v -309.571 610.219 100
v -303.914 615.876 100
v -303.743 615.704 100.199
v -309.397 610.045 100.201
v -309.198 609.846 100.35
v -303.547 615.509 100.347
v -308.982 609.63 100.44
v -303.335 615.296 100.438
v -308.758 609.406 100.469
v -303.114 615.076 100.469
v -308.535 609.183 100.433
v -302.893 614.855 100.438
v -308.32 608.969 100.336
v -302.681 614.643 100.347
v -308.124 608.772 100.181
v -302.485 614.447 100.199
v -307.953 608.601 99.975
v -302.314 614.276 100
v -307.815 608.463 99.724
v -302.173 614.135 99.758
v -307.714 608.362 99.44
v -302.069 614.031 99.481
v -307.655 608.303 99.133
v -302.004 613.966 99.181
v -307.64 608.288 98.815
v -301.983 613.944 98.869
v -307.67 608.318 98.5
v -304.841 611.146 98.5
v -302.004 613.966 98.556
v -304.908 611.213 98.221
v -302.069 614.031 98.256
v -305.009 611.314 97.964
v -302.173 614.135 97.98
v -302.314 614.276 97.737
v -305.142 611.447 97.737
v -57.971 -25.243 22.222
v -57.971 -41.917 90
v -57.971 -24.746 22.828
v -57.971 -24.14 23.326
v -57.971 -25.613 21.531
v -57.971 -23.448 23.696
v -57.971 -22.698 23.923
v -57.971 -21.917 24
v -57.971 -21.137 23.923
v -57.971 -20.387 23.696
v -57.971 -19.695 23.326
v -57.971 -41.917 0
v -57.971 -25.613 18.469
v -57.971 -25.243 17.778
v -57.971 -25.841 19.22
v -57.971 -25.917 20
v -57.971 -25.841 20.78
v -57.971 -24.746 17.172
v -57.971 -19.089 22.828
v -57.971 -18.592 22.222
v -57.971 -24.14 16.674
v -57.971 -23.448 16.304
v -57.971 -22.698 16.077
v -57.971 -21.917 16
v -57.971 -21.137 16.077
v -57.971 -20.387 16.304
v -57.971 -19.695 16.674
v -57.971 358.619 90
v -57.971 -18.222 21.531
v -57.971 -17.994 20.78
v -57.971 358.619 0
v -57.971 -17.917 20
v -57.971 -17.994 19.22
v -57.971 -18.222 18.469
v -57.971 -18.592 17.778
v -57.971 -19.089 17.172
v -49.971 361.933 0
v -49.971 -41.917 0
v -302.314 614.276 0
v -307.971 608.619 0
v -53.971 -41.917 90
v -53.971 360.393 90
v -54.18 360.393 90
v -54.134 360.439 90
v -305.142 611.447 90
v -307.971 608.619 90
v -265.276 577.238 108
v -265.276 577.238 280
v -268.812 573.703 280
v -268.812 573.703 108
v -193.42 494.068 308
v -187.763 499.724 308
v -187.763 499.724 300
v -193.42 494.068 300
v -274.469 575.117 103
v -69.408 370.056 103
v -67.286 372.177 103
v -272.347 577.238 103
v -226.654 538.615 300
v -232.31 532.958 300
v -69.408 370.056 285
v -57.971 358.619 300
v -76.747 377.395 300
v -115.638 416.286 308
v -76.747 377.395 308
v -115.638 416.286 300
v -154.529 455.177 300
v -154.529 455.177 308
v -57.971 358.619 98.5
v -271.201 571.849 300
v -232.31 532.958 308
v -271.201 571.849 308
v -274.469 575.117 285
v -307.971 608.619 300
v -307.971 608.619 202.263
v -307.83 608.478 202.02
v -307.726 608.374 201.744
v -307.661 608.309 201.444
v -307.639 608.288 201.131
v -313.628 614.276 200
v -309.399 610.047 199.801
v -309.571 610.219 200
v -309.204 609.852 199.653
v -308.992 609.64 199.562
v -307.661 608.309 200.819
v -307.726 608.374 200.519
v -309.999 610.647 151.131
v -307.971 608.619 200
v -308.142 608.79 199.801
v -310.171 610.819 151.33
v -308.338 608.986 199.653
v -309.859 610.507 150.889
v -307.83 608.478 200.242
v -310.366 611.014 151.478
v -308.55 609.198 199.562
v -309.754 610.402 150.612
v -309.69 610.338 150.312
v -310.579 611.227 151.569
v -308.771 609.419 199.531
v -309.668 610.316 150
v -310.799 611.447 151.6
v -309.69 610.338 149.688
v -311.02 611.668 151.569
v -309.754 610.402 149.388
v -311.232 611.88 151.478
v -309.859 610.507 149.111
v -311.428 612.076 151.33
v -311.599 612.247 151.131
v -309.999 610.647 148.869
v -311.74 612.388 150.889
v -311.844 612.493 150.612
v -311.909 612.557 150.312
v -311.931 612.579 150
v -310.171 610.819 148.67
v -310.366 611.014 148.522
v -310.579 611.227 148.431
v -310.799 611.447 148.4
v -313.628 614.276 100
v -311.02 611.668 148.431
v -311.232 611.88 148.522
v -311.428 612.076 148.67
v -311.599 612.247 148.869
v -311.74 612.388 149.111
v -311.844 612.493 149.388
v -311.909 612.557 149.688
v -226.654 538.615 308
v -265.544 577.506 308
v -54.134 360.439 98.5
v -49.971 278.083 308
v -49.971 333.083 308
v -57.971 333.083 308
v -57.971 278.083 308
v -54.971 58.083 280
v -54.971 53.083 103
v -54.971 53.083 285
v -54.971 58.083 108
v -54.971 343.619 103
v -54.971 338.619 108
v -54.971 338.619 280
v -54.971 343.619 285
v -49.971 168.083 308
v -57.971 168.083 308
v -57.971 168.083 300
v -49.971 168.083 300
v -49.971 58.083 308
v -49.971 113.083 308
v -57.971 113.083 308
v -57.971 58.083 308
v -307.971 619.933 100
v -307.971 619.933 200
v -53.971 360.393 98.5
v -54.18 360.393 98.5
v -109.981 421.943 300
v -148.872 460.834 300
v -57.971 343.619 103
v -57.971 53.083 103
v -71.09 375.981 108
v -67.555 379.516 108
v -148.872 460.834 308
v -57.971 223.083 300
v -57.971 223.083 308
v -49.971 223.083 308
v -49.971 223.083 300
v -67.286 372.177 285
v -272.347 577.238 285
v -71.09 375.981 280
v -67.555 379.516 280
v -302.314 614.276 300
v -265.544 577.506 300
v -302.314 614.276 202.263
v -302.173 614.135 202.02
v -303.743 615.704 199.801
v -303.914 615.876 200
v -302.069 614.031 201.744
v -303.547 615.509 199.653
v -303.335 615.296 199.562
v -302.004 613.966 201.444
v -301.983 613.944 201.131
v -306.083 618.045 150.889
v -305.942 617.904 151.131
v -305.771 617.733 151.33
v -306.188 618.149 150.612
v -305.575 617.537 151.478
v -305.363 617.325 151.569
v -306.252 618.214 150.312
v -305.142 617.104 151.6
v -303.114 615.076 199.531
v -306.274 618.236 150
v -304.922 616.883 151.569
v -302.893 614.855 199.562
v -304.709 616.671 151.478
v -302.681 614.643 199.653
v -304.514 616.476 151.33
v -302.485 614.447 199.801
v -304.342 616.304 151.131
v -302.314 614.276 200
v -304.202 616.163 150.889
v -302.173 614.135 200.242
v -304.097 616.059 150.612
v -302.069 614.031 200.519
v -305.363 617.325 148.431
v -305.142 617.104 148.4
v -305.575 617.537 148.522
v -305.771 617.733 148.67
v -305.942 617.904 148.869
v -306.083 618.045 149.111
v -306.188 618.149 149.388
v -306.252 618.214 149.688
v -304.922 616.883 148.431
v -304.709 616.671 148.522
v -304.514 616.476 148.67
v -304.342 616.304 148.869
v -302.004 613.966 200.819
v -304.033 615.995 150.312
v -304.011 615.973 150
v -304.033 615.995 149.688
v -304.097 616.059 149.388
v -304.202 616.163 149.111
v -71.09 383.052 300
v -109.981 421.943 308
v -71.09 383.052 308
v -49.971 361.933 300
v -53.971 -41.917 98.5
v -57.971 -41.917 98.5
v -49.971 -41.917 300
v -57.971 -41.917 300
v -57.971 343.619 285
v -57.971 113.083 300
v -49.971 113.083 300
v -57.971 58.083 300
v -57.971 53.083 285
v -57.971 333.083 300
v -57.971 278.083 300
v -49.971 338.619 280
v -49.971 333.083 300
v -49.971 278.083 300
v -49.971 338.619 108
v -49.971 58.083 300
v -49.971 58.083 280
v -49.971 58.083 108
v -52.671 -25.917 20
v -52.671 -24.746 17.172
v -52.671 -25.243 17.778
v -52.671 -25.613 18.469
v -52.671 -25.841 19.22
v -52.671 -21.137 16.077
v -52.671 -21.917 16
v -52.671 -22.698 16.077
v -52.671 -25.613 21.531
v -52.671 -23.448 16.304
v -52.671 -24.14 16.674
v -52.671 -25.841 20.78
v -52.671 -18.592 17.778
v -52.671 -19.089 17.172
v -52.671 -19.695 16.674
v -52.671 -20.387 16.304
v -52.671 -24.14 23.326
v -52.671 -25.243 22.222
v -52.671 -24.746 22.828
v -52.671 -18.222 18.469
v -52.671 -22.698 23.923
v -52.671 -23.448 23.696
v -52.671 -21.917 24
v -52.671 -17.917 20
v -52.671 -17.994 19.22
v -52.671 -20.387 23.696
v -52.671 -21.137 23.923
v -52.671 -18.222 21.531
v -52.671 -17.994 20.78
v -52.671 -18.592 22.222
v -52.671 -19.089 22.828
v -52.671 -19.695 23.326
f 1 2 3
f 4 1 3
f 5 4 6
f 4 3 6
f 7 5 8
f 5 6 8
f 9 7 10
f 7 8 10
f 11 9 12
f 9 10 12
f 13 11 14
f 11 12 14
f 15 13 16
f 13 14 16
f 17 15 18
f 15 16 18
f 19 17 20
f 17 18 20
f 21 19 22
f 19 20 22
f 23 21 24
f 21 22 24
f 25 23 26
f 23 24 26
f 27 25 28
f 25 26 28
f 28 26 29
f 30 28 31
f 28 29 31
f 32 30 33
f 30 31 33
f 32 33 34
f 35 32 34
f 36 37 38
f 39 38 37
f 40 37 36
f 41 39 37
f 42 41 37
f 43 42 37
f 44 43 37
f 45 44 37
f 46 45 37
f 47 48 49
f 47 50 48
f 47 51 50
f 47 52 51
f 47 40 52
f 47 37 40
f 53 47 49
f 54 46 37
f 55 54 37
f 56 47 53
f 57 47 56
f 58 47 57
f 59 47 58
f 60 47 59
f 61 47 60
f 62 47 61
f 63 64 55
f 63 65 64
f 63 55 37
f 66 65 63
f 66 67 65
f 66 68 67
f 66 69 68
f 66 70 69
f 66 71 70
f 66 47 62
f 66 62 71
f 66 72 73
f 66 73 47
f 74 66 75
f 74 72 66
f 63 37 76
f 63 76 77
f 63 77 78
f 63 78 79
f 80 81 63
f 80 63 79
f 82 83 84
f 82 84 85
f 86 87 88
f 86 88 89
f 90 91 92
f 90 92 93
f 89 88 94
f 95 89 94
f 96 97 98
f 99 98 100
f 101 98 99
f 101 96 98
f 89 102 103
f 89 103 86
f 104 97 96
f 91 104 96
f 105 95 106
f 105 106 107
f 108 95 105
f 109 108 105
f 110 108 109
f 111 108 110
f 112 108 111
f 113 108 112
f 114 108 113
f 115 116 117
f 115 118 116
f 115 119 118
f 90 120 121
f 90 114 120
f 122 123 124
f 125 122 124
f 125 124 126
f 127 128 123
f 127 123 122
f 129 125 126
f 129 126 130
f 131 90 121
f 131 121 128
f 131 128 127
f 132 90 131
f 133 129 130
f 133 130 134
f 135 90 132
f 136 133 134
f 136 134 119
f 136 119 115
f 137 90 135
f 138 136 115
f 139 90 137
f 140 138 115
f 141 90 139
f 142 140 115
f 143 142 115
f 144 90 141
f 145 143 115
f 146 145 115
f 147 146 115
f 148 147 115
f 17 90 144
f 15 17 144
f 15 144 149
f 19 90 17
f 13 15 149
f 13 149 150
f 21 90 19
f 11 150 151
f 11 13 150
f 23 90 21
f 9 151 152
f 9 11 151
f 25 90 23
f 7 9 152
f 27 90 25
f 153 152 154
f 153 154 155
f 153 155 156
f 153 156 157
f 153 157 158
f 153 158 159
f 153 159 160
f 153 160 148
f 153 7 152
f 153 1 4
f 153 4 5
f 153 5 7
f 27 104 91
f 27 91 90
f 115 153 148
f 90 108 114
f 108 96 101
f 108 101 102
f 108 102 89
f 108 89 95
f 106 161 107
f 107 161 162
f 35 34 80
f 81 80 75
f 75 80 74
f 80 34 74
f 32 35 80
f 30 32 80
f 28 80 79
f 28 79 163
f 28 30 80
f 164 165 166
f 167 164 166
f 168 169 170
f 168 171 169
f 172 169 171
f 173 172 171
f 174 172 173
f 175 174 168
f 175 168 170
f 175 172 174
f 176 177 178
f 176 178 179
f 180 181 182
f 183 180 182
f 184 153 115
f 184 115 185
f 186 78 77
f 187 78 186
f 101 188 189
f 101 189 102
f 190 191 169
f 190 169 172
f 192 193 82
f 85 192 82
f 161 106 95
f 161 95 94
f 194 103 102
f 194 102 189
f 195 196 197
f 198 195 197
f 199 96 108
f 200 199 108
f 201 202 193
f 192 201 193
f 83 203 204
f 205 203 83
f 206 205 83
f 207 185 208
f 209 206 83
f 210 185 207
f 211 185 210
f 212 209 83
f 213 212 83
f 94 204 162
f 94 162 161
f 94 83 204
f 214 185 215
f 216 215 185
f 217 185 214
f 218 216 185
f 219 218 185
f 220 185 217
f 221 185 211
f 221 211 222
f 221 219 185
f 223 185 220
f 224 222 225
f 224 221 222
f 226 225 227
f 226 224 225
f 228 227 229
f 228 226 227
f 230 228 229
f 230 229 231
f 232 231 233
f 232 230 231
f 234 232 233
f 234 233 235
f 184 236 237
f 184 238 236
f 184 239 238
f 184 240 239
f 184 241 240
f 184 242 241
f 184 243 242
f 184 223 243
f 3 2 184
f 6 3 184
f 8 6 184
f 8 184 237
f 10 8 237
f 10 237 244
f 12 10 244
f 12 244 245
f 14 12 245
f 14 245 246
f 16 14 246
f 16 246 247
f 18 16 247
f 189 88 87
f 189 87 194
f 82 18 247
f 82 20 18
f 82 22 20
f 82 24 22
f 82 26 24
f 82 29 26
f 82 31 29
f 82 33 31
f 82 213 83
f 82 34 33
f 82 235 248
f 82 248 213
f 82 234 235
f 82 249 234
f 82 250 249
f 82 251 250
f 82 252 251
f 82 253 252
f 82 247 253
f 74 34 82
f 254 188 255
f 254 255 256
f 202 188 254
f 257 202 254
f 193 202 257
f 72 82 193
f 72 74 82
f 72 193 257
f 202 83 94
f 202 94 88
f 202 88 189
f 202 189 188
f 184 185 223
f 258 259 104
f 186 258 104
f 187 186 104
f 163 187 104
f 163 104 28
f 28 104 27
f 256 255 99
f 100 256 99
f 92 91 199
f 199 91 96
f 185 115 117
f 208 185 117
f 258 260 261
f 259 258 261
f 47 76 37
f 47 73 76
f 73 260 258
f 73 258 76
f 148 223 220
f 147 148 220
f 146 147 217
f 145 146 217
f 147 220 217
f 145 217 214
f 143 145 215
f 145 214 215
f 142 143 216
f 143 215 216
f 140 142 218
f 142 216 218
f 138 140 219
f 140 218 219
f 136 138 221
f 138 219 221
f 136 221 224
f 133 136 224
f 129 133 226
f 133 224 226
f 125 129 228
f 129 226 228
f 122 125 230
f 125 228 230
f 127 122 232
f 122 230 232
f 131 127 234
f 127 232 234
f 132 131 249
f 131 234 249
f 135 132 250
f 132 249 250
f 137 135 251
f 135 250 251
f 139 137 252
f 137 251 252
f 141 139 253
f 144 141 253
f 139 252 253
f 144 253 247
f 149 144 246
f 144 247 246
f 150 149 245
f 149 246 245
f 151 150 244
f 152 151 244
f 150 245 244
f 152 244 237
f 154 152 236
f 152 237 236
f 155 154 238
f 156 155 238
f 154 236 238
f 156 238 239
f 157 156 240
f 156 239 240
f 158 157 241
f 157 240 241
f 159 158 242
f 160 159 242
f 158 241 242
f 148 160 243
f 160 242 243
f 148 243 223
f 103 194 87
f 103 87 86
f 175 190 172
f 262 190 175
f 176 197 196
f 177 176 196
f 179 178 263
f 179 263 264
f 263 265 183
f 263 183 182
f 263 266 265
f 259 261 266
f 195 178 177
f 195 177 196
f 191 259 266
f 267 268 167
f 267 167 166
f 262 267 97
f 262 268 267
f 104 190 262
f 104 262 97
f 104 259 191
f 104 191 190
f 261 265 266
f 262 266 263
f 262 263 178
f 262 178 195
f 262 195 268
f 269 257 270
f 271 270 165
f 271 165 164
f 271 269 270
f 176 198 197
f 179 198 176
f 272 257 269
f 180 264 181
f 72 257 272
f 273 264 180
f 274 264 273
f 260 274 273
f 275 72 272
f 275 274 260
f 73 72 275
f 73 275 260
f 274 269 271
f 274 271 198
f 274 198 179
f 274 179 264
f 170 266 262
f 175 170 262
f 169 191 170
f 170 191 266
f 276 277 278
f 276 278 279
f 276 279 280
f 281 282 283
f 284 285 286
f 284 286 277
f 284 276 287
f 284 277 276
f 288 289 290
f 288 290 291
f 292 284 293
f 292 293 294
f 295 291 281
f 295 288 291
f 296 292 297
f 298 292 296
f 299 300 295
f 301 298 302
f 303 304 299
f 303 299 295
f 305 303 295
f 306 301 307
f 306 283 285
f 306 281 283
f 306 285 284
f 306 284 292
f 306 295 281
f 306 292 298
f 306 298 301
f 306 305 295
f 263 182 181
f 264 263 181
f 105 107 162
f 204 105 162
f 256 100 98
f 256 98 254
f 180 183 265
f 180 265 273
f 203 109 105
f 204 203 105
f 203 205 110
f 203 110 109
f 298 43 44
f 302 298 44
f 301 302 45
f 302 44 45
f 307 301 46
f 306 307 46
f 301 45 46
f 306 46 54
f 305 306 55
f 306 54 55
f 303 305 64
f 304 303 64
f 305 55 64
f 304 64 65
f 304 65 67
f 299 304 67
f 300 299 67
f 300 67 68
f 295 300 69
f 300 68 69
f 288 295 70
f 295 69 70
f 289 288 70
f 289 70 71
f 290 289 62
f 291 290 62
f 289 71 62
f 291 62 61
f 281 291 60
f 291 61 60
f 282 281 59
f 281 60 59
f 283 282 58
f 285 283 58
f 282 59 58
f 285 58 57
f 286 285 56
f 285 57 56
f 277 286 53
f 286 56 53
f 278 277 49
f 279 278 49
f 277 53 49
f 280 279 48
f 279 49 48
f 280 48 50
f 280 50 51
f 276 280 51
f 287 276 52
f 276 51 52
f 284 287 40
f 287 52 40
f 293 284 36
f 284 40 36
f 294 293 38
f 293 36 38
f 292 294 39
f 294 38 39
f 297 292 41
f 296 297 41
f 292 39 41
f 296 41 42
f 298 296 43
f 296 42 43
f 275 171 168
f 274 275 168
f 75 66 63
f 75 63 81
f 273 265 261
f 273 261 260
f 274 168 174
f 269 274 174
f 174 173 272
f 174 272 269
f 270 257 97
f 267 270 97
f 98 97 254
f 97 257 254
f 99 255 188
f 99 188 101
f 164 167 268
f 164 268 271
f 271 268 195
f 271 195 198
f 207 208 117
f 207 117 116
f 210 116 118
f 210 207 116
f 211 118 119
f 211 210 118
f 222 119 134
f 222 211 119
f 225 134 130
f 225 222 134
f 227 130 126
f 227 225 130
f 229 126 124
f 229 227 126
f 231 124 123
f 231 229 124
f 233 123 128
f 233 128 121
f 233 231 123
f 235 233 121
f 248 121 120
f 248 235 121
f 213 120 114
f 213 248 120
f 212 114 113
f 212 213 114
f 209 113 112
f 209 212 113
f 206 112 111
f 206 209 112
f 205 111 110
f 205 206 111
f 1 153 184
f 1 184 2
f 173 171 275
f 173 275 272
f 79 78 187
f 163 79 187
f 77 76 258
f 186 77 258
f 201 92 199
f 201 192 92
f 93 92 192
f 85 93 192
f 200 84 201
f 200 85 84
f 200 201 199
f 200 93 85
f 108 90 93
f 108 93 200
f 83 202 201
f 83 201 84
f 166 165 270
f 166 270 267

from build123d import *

# Parameters (mm, degrees)
BOSS_EXTRU_1_DEPTH      = 308
ESQUISSE2_W             = 8
ESQUISSE2_H             = 100
ESQUISSE2_H_2           = 55
ENL_V_MAT_EXTRU_1_DEPTH = 8
ESQUISSE3_W             = 172
ESQUISSE3_H             = 280.536291501
ENL_V_MAT_EXTRU_2_DEPTH = 532
ESQUISSE4_R             = 1.6
ESQUISSE4_W             = 172
ESQUISSE4_H             = 279.620784643
ENL_V_MAT_EXTRU_3_DEPTH = 8
ESQUISSE5_W             = 182
ESQUISSE5_H             = 290.536291501
ENL_V_MAT_EXTRU_4_DEPTH = 3
ESQUISSE6_W             = 182
ESQUISSE6_H             = 290
ENL_V_MAT_EXTRU_5_DEPTH = 3
ESQUISSE7_R             = 4
ENL_V_MAT_EXTRU_6_DEPTH = 5.3
ESQUISSE8_W             = 8.5
ESQUISSE8_H             = 406.733495256
ENL_V_MAT_EXTRU_7_DEPTH = 4
ESQUISSE9_W             = 8.5
ESQUISSE9_H             = 359.311541269
ENL_V_MAT_EXTRU_8_DEPTH = 4


with BuildPart() as part:
    # Esquisse1 → Boss.-Extru.1 (new body)
    with BuildSketch(Plane.XY):
        Polygon((-49.970813456, -41.917379116), (-57.970813456, -41.917379116), (-57.970813456, 358.618912385), (-313.627667703, 614.275766632), (-307.970813453, 619.932620882), (-49.970813456, 361.932620884), align=None)
    extrude(amount=BOSS_EXTRU_1_DEPTH)

    # Esquisse2 → Enlèv. mat.-Extru.1 (cut)
    with BuildSketch(Plane.XY.offset(308)):
        with Locations((-53.970813456, 8.082620884)):
            Rectangle(ESQUISSE2_W, ESQUISSE2_H)
        Polygon((-271.201260832, 571.849359761), (-265.544406582, 577.506214011), (-307.970813453, 619.932620882), (-313.627667703, 614.275766632), align=None)
        with Locations((-53.970813456, 140.582620884)):
            Rectangle(ESQUISSE2_W, ESQUISSE2_H_2)
        with Locations((-53.970813456, 250.582620884)):
            Rectangle(ESQUISSE2_W, ESQUISSE2_H_2)
        Polygon((-232.310387866, 532.958486796), (-226.653533617, 538.615341045), (-187.762660652, 499.72446808), (-193.419514901, 494.067613831), align=None)
        Polygon((-154.528641936, 455.176740865), (-148.871787686, 460.833595115), (-109.980914721, 421.94272215), (-115.637768971, 416.2858679), align=None)
        Polygon((-76.746896005, 377.394994935), (-71.090041756, 383.051849184), (-49.970813456, 361.932620884), (-49.970813456, 333.082620884), (-57.970813456, 333.082620884), (-57.970813456, 358.618912385), align=None)
    extrude(amount=-ENL_V_MAT_EXTRU_1_DEPTH, mode=Mode.SUBTRACT)

    # Esquisse3 → Enlèv. mat.-Extru.2 (cut)
    with BuildSketch(Plane.ZY.offset(57.970813456)):
        with Locations((194, 198.350766635)):
            Rectangle(ESQUISSE3_W, ESQUISSE3_H)
    extrude(amount=-ENL_V_MAT_EXTRU_2_DEPTH, mode=Mode.SUBTRACT)

    # Esquisse4 → Enlèv. mat.-Extru.3 (cut)
    with BuildSketch(Plane(origin=(155.980903714, 155.980903714, 0), x_dir=(0, 0, -1), z_dir=(0.707106781186556, 0.7071067811865391, 0))):
        with Locations(Location((-150, 652.126810705, 0), (0, 0, 90))):
            Circle(ESQUISSE4_R)
        with BuildLine():
            Line((-202.2627417, 648.126810705), (-300, 648.126810705))
            Line((-300, 648.126810705), (-300, 656.126810705))
            Line((-300, 656.126810705), (-200, 656.126810705))
            Line((-200, 656.126810705), (-200, 650.389552405))
            ThreePointArc((-200, 650.389552405), (-200, 648.126810705), (-202.2627417, 648.126810705))
        make_face()
        with BuildLine():
            Line((-100, 656.126810705), (-100, 650.389552405))
            ThreePointArc((-100, 650.389552405), (-100, 648.126810705), (-97.7372583, 648.126810705))
            Line((-97.7372583, 648.126810705), (0, 648.126810705))
            Line((0, 648.126810705), (0, 656.126810705))
            Line((0, 656.126810705), (-100, 656.126810705))
        make_face()
        with Locations((-194, 455.937203027)):
            Rectangle(ESQUISSE4_W, ESQUISSE4_H)
    extrude(amount=-ENL_V_MAT_EXTRU_3_DEPTH, mode=Mode.SUBTRACT)

    # Esquisse5 → Enlèv. mat.-Extru.4 (cut)
    with BuildSketch(Plane.ZY.offset(57.970813456)):
        with Locations((194, 198.350766635)):
            Rectangle(ESQUISSE5_W, ESQUISSE5_H)
    extrude(amount=-ENL_V_MAT_EXTRU_4_DEPTH, mode=Mode.SUBTRACT)

    # Esquisse6 → Enlèv. mat.-Extru.5 (cut)
    with BuildSketch(Plane(origin=(150.324049465, 150.324049465, 0), x_dir=(0, 0, 1), z_dir=(-0.707106781186556, -0.7071067811865391, 0))):
        with Locations((194, 455.747595348)):
            Rectangle(ESQUISSE6_W, ESQUISSE6_H)
    extrude(amount=-ENL_V_MAT_EXTRU_5_DEPTH, mode=Mode.SUBTRACT)

    # Esquisse7 → Enlèv. mat.-Extru.6 (cut)
    with BuildSketch(Plane.ZY.offset(57.970813456)):
        with Locations((20, -21.917379116)):
            Circle(ESQUISSE7_R)
    extrude(amount=-ENL_V_MAT_EXTRU_6_DEPTH, mode=Mode.SUBTRACT)

    # Esquisse8 → Enlèv. mat.-Extru.7 (cut)
    with BuildSketch(Plane.ZY.offset(57.970813456)):
        with Locations((94.25, 157.026144561)):
            Rectangle(ESQUISSE8_W, ESQUISSE8_H)
    extrude(amount=-ENL_V_MAT_EXTRU_7_DEPTH, mode=Mode.SUBTRACT)

    # Esquisse9 → Enlèv. mat.-Extru.8 (cut)
    with BuildSketch(Plane(origin=(150.324049465, 150.324049465, 0), x_dir=(0, 0, 1), z_dir=(-0.7071067811865559, -0.7071067811865391, 0))):
        with Locations((94.25, 472.802749855)):
            Rectangle(ESQUISSE9_W, ESQUISSE9_H)
    extrude(amount=-ENL_V_MAT_EXTRU_8_DEPTH, mode=Mode.SUBTRACT)


solid = part.part
